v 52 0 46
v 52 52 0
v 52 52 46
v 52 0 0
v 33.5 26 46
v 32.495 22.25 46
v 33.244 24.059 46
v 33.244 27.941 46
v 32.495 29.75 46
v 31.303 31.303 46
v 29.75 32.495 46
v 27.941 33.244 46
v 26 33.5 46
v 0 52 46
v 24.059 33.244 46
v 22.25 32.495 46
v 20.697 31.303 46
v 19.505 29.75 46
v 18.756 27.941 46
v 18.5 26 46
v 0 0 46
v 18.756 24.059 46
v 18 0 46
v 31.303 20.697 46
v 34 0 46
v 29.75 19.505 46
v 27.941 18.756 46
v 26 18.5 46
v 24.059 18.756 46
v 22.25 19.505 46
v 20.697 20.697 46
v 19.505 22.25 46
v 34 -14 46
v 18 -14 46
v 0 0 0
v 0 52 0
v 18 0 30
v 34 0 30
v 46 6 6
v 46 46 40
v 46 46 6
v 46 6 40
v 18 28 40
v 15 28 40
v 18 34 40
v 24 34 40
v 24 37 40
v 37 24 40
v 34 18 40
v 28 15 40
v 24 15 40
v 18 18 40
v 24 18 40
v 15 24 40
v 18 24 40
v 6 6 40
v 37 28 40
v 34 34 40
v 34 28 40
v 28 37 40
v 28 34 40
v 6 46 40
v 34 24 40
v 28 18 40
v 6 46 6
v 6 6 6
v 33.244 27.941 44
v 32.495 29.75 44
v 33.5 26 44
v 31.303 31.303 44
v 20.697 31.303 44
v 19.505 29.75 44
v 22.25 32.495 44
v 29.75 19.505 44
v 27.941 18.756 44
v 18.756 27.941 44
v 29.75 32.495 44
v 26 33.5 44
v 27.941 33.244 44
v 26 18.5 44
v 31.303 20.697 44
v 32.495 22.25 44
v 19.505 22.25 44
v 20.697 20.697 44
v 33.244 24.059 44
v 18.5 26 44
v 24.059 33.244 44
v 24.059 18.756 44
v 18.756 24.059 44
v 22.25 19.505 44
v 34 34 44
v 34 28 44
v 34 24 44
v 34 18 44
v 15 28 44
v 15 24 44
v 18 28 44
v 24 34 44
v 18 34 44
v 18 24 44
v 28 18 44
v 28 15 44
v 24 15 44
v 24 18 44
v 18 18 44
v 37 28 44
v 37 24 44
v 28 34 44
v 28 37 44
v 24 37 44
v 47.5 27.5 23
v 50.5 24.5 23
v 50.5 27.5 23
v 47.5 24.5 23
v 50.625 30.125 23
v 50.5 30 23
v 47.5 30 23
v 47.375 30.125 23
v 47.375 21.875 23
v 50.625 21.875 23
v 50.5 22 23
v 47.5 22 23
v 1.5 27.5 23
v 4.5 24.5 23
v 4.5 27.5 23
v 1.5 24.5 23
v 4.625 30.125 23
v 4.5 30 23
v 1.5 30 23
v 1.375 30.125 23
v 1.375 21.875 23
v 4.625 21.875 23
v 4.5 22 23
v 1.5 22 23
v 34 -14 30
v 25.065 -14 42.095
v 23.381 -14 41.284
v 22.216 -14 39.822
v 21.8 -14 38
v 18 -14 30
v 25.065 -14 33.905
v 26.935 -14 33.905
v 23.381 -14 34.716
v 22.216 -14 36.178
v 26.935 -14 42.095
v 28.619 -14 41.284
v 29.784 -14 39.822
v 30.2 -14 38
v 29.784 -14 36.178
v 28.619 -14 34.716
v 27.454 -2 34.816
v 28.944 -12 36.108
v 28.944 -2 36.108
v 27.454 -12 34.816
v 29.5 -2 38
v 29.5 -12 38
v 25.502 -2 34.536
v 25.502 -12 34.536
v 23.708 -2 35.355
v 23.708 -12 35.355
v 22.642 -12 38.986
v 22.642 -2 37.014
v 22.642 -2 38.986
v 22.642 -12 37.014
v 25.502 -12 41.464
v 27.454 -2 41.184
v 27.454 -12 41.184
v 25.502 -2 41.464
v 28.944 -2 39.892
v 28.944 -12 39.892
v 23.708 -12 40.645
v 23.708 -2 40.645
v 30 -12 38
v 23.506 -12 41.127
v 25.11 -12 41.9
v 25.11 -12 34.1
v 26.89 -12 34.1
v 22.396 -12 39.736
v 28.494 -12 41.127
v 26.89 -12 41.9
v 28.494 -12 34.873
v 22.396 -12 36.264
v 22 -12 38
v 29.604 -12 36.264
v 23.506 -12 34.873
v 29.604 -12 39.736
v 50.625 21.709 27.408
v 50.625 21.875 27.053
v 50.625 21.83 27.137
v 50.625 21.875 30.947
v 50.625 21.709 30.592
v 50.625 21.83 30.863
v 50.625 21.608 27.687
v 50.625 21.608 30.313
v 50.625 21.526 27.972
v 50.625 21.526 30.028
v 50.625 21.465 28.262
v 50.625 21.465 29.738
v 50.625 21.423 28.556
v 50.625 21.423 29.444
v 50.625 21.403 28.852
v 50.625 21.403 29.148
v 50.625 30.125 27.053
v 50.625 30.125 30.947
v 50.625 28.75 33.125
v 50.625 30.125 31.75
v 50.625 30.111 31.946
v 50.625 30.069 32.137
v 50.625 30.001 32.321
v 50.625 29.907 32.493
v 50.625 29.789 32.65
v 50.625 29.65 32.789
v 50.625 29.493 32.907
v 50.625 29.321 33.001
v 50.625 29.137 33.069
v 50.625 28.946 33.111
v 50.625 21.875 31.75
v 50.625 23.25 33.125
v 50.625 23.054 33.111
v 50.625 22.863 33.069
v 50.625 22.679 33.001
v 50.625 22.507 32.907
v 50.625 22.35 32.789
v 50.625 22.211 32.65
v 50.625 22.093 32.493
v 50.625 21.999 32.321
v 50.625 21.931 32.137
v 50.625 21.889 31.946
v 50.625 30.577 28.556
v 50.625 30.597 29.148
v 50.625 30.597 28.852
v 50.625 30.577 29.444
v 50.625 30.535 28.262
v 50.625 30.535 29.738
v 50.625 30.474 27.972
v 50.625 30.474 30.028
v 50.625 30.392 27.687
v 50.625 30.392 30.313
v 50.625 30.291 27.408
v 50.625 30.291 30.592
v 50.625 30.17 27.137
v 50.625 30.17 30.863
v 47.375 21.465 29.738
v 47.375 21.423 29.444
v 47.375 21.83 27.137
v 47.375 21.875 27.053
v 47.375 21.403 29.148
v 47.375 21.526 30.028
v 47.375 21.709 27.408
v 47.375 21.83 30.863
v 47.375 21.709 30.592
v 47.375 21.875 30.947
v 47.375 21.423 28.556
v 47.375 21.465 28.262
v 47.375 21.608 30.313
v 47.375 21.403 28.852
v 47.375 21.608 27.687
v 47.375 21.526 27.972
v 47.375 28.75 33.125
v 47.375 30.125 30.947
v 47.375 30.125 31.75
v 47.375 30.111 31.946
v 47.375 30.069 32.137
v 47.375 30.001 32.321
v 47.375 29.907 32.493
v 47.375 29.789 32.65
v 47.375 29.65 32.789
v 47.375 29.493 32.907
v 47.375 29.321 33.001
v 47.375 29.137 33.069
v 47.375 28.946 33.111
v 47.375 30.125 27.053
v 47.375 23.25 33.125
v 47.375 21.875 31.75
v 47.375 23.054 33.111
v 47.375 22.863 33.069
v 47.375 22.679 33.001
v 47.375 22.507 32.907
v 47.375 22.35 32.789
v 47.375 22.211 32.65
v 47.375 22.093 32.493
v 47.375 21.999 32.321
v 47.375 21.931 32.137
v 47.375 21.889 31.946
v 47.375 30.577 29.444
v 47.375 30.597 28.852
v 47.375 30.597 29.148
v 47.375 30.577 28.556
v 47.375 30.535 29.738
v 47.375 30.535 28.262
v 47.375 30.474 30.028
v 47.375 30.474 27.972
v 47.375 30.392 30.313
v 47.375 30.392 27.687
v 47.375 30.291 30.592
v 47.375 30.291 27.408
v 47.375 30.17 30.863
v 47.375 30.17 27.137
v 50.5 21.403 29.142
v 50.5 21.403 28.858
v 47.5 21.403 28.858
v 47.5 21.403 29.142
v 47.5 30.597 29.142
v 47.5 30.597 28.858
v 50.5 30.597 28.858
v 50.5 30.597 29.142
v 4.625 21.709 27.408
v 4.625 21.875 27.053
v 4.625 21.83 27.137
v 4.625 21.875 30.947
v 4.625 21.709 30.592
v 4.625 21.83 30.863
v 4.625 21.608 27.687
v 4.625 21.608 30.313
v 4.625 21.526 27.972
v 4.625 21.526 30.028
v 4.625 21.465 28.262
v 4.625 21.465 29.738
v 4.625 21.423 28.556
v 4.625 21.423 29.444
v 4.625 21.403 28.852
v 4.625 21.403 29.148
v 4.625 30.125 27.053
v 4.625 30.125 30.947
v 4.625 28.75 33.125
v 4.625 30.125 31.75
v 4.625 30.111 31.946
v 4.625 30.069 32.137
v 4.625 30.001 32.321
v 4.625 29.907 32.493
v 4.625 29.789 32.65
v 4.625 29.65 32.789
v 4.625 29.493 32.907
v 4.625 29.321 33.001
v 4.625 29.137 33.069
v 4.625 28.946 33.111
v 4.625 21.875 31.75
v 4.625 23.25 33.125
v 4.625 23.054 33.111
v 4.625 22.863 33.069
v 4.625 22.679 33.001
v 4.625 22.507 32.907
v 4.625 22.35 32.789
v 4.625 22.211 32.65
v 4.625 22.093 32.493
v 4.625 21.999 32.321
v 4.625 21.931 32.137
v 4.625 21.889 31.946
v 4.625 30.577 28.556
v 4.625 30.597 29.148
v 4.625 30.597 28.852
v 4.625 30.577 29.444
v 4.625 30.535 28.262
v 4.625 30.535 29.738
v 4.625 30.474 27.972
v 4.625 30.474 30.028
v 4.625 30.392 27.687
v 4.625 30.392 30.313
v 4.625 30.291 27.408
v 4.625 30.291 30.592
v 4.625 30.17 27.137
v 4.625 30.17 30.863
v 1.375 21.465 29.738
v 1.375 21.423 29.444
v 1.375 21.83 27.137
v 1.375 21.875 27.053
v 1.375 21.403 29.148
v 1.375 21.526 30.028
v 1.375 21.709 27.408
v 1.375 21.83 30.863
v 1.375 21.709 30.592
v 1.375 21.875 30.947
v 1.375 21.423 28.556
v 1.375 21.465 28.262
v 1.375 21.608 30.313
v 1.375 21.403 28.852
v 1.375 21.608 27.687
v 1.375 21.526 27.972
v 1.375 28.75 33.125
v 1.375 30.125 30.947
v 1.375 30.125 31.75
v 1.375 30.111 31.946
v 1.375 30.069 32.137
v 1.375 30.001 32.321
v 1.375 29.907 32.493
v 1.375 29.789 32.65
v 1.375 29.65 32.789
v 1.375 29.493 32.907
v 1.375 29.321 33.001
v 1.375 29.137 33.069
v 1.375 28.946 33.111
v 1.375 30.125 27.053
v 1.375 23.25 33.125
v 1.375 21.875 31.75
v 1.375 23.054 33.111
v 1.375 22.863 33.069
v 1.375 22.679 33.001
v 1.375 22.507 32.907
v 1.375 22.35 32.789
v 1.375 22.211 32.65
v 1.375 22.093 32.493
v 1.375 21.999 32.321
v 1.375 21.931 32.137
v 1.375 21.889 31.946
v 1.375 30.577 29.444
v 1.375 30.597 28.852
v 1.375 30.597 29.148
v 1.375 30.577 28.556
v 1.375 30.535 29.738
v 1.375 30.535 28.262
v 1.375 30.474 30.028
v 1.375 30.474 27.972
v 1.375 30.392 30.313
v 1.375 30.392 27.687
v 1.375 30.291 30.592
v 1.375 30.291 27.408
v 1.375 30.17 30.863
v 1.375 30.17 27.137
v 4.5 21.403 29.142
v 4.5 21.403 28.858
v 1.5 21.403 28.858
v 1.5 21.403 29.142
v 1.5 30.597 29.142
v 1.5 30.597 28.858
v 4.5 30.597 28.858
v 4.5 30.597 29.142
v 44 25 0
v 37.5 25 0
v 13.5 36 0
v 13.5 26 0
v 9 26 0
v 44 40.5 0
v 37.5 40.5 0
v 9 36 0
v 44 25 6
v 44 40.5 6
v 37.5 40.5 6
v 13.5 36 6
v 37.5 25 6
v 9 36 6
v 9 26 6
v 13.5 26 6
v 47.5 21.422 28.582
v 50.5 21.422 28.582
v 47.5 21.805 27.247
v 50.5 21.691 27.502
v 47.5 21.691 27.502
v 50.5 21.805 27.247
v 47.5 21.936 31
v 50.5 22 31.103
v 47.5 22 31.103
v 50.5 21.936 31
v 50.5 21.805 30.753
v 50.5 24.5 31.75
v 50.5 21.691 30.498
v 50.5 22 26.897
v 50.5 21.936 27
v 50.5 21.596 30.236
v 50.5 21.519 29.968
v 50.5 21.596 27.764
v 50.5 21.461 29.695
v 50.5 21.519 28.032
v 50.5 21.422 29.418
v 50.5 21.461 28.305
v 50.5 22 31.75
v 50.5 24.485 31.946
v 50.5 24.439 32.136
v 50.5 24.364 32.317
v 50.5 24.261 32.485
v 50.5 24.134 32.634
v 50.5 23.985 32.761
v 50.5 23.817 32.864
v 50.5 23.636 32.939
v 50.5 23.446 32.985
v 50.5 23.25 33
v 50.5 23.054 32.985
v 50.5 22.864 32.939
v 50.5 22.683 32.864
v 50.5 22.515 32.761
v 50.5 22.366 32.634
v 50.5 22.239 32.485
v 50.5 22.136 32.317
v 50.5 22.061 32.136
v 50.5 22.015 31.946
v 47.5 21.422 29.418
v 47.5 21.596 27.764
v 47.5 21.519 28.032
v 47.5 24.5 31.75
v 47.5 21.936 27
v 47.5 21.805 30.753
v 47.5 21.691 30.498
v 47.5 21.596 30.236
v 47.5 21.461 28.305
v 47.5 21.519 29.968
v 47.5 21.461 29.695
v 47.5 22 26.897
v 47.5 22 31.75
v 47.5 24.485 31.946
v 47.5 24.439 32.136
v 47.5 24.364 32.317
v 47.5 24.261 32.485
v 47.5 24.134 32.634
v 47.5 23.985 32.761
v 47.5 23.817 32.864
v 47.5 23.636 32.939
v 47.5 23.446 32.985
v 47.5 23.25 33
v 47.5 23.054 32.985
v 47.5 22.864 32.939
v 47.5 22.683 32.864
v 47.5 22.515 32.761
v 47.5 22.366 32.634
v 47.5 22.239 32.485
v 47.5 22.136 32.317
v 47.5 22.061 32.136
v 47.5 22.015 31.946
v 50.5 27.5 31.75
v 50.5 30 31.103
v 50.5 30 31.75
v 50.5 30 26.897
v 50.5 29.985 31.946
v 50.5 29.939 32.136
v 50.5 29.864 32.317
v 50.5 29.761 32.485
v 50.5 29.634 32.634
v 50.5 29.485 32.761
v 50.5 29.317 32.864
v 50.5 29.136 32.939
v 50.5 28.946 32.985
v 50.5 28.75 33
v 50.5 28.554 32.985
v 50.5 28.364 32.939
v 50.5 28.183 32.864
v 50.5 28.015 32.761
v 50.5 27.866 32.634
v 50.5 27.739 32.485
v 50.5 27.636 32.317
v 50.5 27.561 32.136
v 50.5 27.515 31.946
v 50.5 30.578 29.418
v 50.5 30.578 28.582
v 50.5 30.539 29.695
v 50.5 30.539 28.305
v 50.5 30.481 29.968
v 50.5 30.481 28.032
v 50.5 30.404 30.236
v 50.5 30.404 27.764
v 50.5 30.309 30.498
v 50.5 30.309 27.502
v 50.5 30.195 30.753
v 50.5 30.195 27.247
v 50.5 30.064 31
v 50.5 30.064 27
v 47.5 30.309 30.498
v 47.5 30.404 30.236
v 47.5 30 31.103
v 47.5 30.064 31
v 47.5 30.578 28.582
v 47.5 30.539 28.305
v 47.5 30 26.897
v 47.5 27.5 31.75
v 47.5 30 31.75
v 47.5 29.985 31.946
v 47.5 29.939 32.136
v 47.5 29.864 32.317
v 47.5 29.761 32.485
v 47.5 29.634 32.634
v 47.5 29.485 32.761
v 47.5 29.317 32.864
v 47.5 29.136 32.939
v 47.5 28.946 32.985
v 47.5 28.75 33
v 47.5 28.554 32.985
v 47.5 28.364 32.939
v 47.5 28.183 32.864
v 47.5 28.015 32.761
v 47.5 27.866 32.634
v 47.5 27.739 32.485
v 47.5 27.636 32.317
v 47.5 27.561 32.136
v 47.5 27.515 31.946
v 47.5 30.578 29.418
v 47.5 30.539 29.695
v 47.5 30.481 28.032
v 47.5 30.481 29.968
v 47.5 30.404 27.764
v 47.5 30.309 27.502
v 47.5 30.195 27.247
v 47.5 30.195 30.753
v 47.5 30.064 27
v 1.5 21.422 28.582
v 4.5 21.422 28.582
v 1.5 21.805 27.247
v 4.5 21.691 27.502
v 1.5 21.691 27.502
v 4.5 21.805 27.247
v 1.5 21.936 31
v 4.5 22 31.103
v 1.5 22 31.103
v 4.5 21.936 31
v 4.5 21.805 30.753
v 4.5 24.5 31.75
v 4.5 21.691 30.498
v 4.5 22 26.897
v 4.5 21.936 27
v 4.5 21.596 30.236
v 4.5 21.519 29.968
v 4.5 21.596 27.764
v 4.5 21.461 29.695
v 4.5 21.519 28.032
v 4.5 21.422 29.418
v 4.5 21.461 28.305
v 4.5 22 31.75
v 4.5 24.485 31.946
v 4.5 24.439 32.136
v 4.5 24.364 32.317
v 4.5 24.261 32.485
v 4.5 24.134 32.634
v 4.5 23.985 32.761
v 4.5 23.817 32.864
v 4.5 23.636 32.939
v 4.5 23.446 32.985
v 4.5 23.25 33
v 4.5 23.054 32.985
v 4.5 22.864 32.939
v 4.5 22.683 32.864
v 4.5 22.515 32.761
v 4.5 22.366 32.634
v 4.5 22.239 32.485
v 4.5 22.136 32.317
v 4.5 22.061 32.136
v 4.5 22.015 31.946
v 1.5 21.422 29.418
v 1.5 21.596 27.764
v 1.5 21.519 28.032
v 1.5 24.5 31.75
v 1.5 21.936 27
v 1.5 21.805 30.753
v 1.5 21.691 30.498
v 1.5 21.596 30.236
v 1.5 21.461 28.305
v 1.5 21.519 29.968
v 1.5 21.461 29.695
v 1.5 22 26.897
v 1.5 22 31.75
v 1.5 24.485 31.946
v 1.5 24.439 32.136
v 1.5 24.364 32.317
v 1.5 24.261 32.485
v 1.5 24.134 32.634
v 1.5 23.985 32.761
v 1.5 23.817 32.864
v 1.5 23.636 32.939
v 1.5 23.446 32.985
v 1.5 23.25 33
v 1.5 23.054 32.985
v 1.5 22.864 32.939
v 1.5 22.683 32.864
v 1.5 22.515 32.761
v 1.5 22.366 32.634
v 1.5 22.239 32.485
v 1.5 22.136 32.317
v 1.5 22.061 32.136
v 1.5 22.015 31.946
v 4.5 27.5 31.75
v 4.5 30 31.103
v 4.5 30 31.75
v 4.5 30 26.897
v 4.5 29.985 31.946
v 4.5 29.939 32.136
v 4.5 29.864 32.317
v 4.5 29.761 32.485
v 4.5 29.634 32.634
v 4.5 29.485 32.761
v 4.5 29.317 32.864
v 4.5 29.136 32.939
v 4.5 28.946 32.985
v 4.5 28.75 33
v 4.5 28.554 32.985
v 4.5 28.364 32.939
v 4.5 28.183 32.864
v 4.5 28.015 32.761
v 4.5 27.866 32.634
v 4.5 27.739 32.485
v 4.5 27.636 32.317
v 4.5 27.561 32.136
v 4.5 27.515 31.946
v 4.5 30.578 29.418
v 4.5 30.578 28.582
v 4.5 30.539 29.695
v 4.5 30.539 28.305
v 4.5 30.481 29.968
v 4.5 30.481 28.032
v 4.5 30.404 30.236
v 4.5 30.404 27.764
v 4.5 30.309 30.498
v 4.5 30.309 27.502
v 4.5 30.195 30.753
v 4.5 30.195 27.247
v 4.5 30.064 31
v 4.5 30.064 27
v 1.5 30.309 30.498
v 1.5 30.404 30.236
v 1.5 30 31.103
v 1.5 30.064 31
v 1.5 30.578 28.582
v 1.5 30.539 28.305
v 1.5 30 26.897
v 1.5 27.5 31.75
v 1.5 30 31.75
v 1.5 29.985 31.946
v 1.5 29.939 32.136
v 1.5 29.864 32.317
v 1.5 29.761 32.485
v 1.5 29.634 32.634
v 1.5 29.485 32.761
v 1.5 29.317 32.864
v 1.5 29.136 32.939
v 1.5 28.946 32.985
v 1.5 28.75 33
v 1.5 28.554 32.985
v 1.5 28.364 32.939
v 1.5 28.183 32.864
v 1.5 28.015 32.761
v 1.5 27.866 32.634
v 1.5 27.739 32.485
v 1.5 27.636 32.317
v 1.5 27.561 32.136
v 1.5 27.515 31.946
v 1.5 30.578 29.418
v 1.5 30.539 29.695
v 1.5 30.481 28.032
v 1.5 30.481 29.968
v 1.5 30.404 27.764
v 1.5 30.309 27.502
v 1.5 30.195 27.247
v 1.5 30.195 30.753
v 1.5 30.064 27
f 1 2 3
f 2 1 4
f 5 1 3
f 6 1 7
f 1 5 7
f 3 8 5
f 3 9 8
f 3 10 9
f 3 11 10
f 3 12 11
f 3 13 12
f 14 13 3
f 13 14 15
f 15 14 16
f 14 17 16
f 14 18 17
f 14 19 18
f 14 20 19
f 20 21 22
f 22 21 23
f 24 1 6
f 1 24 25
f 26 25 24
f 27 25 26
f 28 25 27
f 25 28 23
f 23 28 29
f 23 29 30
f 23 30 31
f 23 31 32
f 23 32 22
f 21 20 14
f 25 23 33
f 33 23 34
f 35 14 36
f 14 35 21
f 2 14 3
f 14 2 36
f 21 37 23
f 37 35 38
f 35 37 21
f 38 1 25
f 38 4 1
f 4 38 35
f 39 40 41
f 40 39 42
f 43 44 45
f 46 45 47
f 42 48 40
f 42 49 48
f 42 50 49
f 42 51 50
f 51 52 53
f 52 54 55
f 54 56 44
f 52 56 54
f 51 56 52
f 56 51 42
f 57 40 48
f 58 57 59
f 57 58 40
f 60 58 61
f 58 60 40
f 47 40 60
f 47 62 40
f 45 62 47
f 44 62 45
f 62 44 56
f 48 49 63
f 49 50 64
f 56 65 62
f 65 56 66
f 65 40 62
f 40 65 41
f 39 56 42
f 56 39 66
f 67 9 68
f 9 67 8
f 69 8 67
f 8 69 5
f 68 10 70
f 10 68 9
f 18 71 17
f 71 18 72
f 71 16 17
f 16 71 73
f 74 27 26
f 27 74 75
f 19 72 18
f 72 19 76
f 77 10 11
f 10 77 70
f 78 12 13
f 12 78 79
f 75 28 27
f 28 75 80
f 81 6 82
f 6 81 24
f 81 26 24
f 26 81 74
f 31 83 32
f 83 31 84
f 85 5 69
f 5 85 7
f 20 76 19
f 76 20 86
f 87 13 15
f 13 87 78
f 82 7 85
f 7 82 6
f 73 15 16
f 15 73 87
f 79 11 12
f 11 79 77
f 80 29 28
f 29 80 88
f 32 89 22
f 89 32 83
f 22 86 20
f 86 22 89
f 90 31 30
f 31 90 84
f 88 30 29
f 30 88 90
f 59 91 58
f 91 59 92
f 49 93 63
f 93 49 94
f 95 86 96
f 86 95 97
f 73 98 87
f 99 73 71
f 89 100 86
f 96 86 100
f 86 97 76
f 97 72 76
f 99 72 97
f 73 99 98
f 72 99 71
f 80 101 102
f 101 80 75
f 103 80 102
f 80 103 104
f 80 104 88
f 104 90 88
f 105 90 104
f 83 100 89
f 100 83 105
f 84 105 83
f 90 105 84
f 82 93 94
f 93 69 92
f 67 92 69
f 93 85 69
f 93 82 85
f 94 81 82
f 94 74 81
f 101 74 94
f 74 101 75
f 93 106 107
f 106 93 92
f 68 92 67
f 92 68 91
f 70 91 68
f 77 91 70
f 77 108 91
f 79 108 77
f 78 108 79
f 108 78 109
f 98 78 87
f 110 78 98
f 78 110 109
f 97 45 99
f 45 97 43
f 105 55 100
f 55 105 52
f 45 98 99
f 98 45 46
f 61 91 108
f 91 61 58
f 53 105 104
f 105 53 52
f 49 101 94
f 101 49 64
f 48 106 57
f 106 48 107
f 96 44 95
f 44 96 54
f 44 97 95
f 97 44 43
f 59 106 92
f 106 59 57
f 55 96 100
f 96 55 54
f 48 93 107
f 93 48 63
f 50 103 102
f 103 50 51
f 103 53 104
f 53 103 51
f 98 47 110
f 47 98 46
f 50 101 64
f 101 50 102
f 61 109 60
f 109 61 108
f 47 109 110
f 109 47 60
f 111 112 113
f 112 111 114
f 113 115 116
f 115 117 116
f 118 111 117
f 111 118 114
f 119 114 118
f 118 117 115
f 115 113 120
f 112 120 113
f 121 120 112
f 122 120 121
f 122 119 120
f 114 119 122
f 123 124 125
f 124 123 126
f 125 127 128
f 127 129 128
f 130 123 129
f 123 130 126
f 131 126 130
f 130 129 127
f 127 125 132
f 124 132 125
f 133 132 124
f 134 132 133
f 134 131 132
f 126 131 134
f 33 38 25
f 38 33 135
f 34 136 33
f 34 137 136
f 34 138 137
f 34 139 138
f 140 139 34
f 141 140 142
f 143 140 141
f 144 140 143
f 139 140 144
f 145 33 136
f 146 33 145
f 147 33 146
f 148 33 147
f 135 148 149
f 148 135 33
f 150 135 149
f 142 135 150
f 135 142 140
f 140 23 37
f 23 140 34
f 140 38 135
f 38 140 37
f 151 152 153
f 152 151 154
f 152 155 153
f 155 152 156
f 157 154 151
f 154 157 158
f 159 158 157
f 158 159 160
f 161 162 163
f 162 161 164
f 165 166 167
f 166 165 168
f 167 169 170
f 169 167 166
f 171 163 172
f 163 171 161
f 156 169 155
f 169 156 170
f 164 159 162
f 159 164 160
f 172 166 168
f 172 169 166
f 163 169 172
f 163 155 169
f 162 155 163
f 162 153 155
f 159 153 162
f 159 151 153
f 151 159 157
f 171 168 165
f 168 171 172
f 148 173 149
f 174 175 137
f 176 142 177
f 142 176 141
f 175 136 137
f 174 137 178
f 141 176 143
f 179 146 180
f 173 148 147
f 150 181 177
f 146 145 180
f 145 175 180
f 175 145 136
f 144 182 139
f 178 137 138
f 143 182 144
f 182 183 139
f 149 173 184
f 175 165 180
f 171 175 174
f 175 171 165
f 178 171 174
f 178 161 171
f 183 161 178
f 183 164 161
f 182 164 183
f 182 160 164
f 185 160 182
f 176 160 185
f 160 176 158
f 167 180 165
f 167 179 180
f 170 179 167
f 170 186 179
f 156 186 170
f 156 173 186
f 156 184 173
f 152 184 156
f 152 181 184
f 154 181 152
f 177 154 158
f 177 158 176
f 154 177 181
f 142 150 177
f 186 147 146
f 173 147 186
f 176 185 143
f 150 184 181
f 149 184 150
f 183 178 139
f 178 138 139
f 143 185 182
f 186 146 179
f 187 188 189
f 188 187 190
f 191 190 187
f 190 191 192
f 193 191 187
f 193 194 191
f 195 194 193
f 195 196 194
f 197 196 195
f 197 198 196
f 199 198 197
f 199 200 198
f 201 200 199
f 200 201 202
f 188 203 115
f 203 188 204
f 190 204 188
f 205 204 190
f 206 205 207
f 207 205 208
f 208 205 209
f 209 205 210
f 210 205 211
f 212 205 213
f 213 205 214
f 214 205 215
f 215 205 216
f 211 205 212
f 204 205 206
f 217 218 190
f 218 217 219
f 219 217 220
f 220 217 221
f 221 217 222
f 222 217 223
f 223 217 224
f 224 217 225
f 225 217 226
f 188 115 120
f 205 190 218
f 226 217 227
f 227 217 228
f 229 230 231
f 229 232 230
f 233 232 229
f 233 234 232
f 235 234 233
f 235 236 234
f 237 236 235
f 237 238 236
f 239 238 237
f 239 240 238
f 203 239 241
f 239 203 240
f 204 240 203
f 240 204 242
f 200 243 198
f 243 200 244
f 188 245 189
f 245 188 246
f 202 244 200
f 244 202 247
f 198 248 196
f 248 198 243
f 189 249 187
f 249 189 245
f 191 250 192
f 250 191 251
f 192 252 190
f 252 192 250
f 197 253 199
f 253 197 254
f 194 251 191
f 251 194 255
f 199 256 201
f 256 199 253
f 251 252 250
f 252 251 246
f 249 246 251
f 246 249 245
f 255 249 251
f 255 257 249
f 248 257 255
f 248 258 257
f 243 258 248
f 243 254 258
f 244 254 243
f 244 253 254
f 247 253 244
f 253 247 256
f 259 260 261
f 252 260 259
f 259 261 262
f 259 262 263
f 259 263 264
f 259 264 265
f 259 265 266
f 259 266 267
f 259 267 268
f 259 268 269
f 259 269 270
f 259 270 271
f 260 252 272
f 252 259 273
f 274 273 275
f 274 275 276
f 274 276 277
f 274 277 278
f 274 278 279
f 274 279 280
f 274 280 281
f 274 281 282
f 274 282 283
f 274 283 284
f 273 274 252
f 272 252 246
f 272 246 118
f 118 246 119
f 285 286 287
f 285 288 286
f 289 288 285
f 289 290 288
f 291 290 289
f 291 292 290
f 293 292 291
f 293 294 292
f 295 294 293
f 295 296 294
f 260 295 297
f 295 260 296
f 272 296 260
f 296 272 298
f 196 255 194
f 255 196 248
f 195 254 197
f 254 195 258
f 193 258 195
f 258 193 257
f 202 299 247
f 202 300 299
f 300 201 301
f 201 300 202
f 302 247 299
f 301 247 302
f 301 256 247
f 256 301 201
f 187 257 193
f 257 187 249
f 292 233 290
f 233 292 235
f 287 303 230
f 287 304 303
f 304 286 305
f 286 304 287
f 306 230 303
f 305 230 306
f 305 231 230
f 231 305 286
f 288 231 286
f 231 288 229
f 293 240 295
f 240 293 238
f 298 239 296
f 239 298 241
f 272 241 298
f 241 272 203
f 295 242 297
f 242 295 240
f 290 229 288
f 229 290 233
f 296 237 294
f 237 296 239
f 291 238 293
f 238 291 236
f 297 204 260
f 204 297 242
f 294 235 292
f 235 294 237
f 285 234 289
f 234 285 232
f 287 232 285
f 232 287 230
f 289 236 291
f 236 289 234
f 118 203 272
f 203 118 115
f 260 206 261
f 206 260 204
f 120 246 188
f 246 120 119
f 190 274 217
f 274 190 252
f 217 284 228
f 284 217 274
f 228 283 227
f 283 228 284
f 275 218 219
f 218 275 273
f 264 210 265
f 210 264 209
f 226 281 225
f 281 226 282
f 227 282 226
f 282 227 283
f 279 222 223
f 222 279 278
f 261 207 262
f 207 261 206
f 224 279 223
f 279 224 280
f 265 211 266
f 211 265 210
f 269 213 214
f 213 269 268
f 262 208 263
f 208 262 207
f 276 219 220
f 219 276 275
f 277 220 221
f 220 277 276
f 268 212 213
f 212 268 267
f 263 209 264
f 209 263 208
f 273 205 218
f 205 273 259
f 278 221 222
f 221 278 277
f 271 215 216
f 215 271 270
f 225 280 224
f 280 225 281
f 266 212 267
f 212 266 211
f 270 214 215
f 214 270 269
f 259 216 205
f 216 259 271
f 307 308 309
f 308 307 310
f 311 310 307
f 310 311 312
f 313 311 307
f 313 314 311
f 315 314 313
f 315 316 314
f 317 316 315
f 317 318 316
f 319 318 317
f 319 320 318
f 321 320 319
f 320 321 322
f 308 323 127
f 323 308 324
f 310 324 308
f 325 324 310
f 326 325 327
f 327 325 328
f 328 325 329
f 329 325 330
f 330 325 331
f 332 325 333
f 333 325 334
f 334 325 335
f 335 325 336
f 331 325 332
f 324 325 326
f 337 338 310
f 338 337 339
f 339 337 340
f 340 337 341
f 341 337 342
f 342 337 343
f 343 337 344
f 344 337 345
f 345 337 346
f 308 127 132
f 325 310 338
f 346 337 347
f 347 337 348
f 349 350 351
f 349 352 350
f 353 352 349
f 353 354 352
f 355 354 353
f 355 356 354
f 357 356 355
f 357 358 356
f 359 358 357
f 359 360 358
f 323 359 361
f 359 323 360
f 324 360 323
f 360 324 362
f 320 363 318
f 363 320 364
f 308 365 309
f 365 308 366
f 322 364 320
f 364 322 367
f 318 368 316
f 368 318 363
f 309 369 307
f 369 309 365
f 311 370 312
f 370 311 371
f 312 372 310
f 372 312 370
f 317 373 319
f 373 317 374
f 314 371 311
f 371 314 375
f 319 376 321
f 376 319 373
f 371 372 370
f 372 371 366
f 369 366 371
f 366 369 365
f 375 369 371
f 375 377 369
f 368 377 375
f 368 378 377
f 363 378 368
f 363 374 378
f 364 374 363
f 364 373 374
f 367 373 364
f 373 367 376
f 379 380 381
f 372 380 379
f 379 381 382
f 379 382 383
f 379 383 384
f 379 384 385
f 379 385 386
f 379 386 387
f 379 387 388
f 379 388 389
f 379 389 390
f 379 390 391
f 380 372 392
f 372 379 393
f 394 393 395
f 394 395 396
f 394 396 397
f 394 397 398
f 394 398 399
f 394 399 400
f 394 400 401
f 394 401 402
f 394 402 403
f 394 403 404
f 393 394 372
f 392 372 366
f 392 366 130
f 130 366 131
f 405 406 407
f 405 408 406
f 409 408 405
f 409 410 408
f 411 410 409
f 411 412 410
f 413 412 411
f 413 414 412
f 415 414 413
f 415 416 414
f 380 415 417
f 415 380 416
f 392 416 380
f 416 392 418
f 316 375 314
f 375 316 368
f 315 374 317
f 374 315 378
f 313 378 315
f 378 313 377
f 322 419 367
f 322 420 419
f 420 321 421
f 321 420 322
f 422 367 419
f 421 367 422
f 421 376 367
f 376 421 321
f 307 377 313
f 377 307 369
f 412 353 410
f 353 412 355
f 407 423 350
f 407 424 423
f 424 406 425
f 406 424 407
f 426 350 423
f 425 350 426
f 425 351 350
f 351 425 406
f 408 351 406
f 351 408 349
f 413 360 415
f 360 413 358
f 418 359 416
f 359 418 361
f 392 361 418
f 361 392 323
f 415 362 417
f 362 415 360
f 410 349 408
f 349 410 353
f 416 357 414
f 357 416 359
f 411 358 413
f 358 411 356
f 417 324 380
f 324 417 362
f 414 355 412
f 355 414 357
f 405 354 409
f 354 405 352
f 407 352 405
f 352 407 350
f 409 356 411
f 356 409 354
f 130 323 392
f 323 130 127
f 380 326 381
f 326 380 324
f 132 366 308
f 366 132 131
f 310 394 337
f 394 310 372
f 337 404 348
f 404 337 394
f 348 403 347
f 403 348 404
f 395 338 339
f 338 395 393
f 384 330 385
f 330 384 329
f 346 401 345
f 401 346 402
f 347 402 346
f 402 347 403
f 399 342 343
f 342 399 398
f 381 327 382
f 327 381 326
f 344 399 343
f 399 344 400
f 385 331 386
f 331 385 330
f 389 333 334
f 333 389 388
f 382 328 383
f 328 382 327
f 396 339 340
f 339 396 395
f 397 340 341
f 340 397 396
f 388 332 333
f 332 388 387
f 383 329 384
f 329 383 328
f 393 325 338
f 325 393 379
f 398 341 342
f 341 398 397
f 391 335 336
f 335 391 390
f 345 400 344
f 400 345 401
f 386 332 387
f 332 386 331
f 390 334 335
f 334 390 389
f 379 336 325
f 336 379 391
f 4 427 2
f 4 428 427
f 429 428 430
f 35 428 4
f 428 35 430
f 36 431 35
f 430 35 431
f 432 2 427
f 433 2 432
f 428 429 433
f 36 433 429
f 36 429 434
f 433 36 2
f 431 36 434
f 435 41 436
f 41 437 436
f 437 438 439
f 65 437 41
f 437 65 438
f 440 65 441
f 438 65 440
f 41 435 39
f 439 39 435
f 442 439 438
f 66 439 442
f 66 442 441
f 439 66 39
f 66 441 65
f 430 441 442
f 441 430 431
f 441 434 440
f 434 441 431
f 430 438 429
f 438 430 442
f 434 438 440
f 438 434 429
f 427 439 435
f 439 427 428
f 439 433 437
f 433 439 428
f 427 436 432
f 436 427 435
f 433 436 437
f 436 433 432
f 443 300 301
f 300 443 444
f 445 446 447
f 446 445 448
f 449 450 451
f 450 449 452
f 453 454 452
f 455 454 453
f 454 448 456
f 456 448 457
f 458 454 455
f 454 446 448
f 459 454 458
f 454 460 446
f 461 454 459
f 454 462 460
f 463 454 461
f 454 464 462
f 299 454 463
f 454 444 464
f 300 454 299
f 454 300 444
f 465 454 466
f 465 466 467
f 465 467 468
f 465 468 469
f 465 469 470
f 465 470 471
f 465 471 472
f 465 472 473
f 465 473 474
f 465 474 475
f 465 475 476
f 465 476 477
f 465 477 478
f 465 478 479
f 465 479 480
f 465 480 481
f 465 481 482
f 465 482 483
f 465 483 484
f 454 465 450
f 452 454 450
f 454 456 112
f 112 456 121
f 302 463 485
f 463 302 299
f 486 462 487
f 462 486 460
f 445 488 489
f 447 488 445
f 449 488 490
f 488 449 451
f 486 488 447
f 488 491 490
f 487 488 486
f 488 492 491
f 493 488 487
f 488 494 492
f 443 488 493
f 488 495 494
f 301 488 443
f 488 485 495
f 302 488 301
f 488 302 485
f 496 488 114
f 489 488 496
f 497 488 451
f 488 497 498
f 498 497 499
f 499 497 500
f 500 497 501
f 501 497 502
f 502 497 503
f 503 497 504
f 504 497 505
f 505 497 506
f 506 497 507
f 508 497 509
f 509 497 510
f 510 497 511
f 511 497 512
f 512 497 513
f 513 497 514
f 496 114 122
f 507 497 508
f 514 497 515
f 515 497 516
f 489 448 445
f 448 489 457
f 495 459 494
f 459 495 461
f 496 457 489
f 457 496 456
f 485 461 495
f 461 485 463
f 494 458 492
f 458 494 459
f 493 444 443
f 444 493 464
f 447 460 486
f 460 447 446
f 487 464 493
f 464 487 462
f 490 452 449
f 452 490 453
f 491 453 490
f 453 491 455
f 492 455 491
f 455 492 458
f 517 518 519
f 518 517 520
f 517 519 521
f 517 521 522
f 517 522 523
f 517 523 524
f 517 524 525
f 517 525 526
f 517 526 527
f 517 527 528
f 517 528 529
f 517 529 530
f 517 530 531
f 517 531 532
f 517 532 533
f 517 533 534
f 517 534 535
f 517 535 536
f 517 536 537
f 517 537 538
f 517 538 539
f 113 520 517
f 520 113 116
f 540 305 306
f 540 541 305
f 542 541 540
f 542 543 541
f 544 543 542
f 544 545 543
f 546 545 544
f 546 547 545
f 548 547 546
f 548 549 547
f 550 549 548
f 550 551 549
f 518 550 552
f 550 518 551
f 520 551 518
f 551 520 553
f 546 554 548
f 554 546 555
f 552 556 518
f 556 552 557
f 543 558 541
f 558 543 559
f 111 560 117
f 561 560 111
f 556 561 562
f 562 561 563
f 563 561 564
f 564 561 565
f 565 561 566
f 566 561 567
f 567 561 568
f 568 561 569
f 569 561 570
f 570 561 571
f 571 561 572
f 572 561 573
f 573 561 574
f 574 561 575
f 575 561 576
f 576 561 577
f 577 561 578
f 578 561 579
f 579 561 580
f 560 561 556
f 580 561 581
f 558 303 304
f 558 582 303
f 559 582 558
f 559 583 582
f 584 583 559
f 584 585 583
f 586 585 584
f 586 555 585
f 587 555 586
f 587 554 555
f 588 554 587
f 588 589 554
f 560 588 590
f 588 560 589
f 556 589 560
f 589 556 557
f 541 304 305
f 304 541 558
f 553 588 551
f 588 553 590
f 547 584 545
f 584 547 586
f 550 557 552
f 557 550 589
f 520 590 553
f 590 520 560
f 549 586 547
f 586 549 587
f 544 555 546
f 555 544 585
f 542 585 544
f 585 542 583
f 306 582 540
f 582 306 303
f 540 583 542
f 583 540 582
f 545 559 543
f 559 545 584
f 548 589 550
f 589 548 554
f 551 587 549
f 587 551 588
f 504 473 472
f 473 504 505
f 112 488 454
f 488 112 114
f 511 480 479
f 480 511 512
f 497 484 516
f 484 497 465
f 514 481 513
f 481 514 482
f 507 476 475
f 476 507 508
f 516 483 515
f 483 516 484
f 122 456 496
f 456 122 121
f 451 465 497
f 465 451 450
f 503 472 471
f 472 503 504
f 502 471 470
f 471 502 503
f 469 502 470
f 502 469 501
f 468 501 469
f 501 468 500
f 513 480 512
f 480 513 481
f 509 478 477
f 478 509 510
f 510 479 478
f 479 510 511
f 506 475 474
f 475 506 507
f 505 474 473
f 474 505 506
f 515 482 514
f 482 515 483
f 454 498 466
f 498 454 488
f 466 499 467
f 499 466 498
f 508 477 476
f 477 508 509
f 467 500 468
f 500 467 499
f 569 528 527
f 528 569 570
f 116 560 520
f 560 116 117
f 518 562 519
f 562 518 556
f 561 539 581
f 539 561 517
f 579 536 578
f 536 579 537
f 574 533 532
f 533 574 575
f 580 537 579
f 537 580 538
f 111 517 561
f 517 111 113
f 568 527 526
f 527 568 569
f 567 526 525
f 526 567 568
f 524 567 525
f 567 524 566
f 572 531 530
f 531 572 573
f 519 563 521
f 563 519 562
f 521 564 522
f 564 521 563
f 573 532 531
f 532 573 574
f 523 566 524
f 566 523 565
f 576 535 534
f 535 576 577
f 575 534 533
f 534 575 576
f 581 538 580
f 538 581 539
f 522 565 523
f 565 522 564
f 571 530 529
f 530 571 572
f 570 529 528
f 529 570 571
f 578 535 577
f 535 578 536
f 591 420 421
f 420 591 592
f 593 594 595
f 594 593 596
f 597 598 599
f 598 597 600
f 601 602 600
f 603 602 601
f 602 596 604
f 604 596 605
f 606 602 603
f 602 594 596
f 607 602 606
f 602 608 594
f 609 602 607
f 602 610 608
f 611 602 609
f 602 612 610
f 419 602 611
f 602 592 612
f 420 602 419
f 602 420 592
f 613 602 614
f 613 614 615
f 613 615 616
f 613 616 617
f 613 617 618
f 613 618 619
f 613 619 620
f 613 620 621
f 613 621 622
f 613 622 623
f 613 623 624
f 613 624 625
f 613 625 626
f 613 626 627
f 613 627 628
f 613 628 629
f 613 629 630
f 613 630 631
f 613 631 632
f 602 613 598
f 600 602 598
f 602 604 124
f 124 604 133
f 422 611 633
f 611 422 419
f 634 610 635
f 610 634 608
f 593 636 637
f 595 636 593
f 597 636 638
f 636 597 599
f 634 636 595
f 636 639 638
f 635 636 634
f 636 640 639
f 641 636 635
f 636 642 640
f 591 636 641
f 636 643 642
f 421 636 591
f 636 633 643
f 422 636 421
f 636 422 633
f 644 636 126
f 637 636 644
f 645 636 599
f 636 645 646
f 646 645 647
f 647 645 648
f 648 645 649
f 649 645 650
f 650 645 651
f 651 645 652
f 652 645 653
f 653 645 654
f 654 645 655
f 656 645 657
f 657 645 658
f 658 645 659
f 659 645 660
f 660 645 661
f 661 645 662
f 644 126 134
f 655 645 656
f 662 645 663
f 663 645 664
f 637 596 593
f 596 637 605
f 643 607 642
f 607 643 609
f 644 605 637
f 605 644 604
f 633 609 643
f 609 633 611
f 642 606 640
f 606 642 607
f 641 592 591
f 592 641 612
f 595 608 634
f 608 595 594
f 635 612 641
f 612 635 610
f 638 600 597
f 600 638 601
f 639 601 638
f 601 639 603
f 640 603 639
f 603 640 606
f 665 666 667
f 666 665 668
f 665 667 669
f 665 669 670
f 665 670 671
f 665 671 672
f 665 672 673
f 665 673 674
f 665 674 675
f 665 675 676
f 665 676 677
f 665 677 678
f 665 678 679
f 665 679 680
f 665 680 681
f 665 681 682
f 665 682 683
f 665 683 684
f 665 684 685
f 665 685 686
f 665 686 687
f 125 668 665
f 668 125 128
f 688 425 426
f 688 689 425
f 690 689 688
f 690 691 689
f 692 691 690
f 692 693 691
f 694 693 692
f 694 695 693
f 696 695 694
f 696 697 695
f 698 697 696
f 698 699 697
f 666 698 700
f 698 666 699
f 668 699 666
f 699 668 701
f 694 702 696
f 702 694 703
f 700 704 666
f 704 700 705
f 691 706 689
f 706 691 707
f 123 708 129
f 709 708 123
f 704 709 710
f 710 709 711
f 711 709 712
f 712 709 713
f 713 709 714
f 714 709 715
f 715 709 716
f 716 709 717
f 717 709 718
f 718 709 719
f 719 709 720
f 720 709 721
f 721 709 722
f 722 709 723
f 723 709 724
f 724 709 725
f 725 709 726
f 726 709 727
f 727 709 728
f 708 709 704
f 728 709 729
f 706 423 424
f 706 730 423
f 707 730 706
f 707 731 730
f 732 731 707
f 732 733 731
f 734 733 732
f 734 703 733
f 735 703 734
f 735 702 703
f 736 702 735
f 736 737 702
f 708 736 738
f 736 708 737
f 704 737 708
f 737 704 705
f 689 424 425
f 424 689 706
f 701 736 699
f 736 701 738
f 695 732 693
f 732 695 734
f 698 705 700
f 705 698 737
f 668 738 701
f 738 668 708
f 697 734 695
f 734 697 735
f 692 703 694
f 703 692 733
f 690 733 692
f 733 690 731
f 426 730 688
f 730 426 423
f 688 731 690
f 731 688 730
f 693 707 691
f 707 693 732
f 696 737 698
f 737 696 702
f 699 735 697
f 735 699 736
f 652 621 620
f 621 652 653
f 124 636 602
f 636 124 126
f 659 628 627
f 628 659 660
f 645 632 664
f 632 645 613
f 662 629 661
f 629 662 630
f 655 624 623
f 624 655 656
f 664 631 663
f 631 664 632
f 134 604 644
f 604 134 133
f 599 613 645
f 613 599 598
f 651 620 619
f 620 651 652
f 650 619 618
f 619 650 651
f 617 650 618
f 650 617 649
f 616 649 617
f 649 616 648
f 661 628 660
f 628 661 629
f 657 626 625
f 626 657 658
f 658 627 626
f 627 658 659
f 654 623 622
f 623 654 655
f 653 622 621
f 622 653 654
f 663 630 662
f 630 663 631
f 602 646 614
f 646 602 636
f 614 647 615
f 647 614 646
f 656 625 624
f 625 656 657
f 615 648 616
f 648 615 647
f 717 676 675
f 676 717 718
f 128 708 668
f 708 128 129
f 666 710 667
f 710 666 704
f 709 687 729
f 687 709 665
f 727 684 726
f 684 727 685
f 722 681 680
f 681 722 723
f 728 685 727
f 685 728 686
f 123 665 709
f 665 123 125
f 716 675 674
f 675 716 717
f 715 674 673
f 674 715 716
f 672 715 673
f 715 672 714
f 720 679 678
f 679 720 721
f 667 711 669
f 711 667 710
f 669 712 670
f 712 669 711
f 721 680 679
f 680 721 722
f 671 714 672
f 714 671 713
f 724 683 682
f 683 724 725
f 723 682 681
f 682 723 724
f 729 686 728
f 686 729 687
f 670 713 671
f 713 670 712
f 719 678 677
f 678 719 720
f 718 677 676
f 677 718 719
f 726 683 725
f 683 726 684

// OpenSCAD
// file: parameterized_clip.scad
// parameterized_clip.scad
// Copyright (c)2023 DP design / Daniel Perry
// place this file in the correct OpenSCAD library directory for your operating system,
// then add:
// use parameterized_clip.scad
// to your code


clip_width = 10;
clip_length = 20;
clip_thickness = 20;
clip_arm_width = 1;
clip_body_length = 4;
tab_protrusion = 0.8;
clip_male_female_delta = 0.25;
angled_clip_Boolean = true;    // need a larger clip_thickness to make sense
locking_clip_Boolean = true;

$fs = 0.2;
$fa = 4;

test_body1();
translate([0, 50,0]) test_body2();
//test_body3();

module test_body1() {
    difference() {
        union() {
            cube([30, 20, 5], center = true);
            translate([14.9, 0, -0.5*(5-3)]) male_clip(clip_length, clip_width, 3, clip_arm_width, clip_body_length, tab_protrusion, false, false);

        }
        translate([-15.1, 0, -0.5*(5-3)]) female_clip(clip_length, clip_width, 3, clip_arm_width, clip_body_length, tab_protrusion, false, false, clip_male_female_delta);
    }
}

module test_body2() {   // angled clip
    difference() {
        union() {
            cube([30, 20, 30], center = true);
            translate([14.9, 0, 0]) male_clip( 20, 10, 20, 1, 0, 0.8, true, false );
        }
        translate([-15.1, 0, 0]) female_clip( 20, 10, 20, 1, 0, 0.8, true, false, clip_male_female_delta );
    }
}

module test_body3() {   // angled clip
    difference() {
        union() {
            cube([30, 20, 30], center = true);
            translate([14.9, 0, 0]) male_clip( 20, 10, 20, 1, 0, 0.8, true, true );
        }
        translate([-15.1, 0, 0]) female_clip( 20, 10, 20, 1, 0, 0.8, true, true, clip_male_female_delta );
    }
}


// male_clip( clip_length, clip_width, clip_thickness, clip_arm_width, clip_body_length, tab_protrusion, angled_clip_Boolean, locking_clip_Boolean );
// translate([0, 30, 0])
//      female_clip( clip_length, clip_width, clip_thickness, clip_arm_width, clip_body_length, tab_protrusion, angled_clip_Boolean, locking_clip_Boolean, clip_male_female_delta );

module female_clip(clength, cwidth, cthick, carmw, cbodyl, tabp, acBool, lcBool, delta) {
    tab_dist_from_end = 4;
    tab_radius = 4 + delta;
    blocker_length = 2*tab_radius + 2;
    difference() {
        union() {
            hull() {
                translate([clength - 0.5*carmw, -0.5*(cwidth - carmw), 0]) cylinder( h = cthick + delta, d = carmw + delta, center = true );
                translate([1, -0.5*(cwidth - carmw), 0]) cube([2, carmw + delta, cthick + delta], center = true);
            // }
            // hull() {
                translate([clength - 0.5*carmw, 0.5*(cwidth - carmw), 0]) cylinder( h = cthick + delta, d = carmw + delta, center = true );
                translate([1, 0.5*(cwidth - carmw), 0]) cube([2, carmw + delta, cthick + delta], center = true);
            }
            translate([0.5*cbodyl, 0, 0]) cube([cbodyl, cwidth, cthick + delta], center = true);

            difference() {
                translate([clength - tab_dist_from_end, -0.5*cwidth + tab_radius - tabp, 0]) cylinder(h = cthick + delta, r = tab_radius, center = true);
                translate([clength - tab_dist_from_end, -0.5*cwidth + 0.5*carmw + 0.5*blocker_length, 0]) 
                    cube([blocker_length, blocker_length, cthick + 2], center = true);
                if (lcBool) {
                    translate([clength - 0.5*blocker_length - tab_dist_from_end, -0.5*blocker_length, 0])
                        cube([blocker_length, blocker_length, cthick + 2], center = true);
                }
            }
            difference() {
                translate([clength - tab_dist_from_end, 0.5*cwidth - (tab_radius - tabp), 0]) cylinder(h = cthick + delta, r = tab_radius, center = true);
                translate([clength - tab_dist_from_end, 0.5*cwidth - 0.5*carmw - 0.5*blocker_length, 0]) 
                    cube([blocker_length, blocker_length, cthick + 2], center = true);
                if (lcBool) {
                    translate([clength - 0.5*blocker_length - tab_dist_from_end, cwidth - 0.5*blocker_length, 0])
                        cube([blocker_length, blocker_length, cthick + 2], center = true);
                }
            }
        }
        if (acBool) {
            translate([0.5*clength, 0, -0.5*cthick])  rotate([0, 55, 0])
                cube([clength/(2*sin(55)), 2*cwidth, 5*cthick], center = true );
        }

    }
}

module male_clip(clength, cwidth, cthick, carmw, cbodyl, tabp, acBool, lcBool ) {
    tab_dist_from_end = 4;
    tab_radius = 4;
    blocker_length = 2*tab_radius + 2;
    difference() {
        union() {
            hull() {
                translate([clength - 0.5*carmw, -0.5*(cwidth - carmw), 0]) cylinder( h = cthick, d = carmw, center = true );
                translate([1, -0.5*(cwidth - carmw), 0]) cube([2, carmw, cthick], center = true);
            }
            hull() {
                translate([clength - 0.5*carmw, 0.5*(cwidth - carmw), 0]) cylinder( h = cthick, d = carmw, center = true );
                translate([1, 0.5*(cwidth - carmw), 0]) cube([2, carmw, cthick], center = true);
            }
            translate([0.5*cbodyl, 0, 0]) cube([cbodyl, cwidth, cthick], center = true);

            difference() {
                translate([clength - tab_dist_from_end, -0.5*cwidth + tab_radius - tabp, 0]) cylinder(h = cthick, r = tab_radius, center = true);
                translate([clength - tab_dist_from_end, -0.5*cwidth + 0.5*carmw + 0.5*blocker_length, 0]) 
                    cube([blocker_length, blocker_length, cthick + 2], center = true);
                if (lcBool) {
                    translate([clength - 0.5*blocker_length - tab_dist_from_end, -0.5*blocker_length, 0])
                        cube([blocker_length, blocker_length, cthick + 2], center = true);
                }
            }
            difference() {
                translate([clength - tab_dist_from_end, 0.5*cwidth - (tab_radius - tabp), 0]) cylinder(h = cthick, r = tab_radius, center = true);
                translate([clength - tab_dist_from_end, 0.5*cwidth - 0.5*carmw - 0.5*blocker_length, 0]) 
                    cube([blocker_length, blocker_length, cthick + 2], center = true);
                if (lcBool) {
                    translate([clength - 0.5*blocker_length - tab_dist_from_end, cwidth - 0.5*blocker_length, 0])
                        cube([blocker_length, blocker_length, cthick + 2], center = true);
                }
             }
        }
        if (acBool) {
            translate([0.5*clength, 0, -0.5*cthick])  rotate([0, 55, 0])
                cube([clength/(2*sin(55)), 2*cwidth, 5*cthick], center = true );
        }
    }
}
// main file
use <parameterized_clip.scad>;

width=38;
height=38;
depth=32;

thickness=6;

module usbc() {
    cube([10, 4.5, 10]);
}

module hdmi() {
    cube([15.5, 6.5, 10]);
}

module lens_mount() {
    cylinder(r=7.5, h=20);
    translate([-8, -8, 0]) {
            cube([16, 16, 5]);
    }
    translate([-22/2, -2, 0]) {
            cube([22, 4, 5]);
    }
    translate([2, -22/2, 0]) {
        rotate([0, 0, 90]) {
            cube([22, 4, 5]);
        }
    }
}

module camera_inner() {
    cube([width, height, depth]);
    translate([6.5, 19, -10]) {
        rotate([0, 0, 90]) {
            usbc();
        }
    }

    translate([width-1, 18, -10]) {
        rotate([0, 0, 90]) {
            hdmi();
        }
    }

    translate([width / 2, height / 2, depth]) {
            lens_mount();
    }
}

module box(width, height, depth, thickness) {
    difference() {
        cube([width, height, depth]);
        translate([thickness, thickness, thickness]) {
            cube([width - 2 * thickness, height - 2 * thickness, depth - 2 * thickness]);
        }
    }
}

module tripod_mount() {
    difference() {
        cube([16, 16, 14]);
        translate([8, 8, 0]) {
            cylinder(12, 3.5, 3.5);
        }
        translate([8, 8, 0]) {
            cylinder(2, 4.2, 4.0);
        }
    }
}

box_margin = 2;

centre_offset = box_margin/2 + thickness;
box_width = width + box_margin + 2*thickness;
box_height = height + box_margin + 2*thickness;
box_depth = depth + box_margin + 2*thickness;

module casing() {

    box_margin = 2;

    centre_offset = box_margin/2 + thickness;
    box_width = width + box_margin + 2*thickness;
    box_height = height + box_margin + 2*thickness;
    box_depth = depth + box_margin + 2*thickness;

    difference(){
        box(box_width, box_height, box_depth, thickness);
        
        translate([centre_offset, centre_offset, centre_offset]) {
            camera_inner();
        }
    };
}

clip_width = 8;
clip_length = 10;
clip_thickness = thickness/2;
clip_arm_width = 2.5;
clip_body_length = 0;
tab_protrusion = 0.6;
clip_male_female_delta = 0.25;

module back() {
    intersection() {
        casing();
        cube([box_width*2, box_height*2, box_depth/2]);
    }
    translate([box_width-thickness/2, box_height/2, box_depth/2]) {
        rotate([0, -90, 0]) {
            male_clip(clip_length, clip_width, clip_thickness, clip_arm_width, clip_body_length, tab_protrusion, false, false);
        }
    }
    translate([thickness/2, box_height/2, box_depth/2]) {
        rotate([0, -90, 0]) {
            male_clip(clip_length, clip_width, clip_thickness, clip_arm_width, clip_body_length, tab_protrusion, false, false);
        }
    }
}

module front() {
        difference() {
        //        translate([8, 8, 0]) {
        //    cylinder(8, 3, 3);
        //}
            union() {
                difference() {
                    casing();                
                    translate([-box_width, -box_height, -box_depth/2]) {
                        cube([box_width*3, box_height*3, box_depth]);
                    }
                }

                translate([box_width/2-8,-14,box_depth]) {
                    rotate([-90,0,0]) {
                        tripod_mount();
                    }
                }
            }

            translate([box_width-thickness/2, box_height/2, box_depth/2]) {
                rotate([0, -90, 0]) {
                    female_clip(clip_length, clip_width, clip_thickness, clip_arm_width, clip_body_length, tab_protrusion, false, false, clip_male_female_delta);
                }
            }

            translate([thickness/2, box_height/2, box_depth/2]) {
                rotate([0, -90, 0]) {
                    female_clip(clip_length, clip_width, clip_thickness, clip_arm_width, clip_body_length, tab_protrusion, false, false, clip_male_female_delta);
                }
            }
        }
}

module explode(distance = [0, 0, $t* 30], center = false, enable = true) {
    if(enable){
        offset = center ? (($children * distance) / 2 - distance / 2) * -1 : [0, 0 , 0];
        for(i = [0 : 1 : $children - 1]) {
            translate(-i * distance + offset) {
                children(i);
            }
        }
    } else {
        children();
    }
}

explode() {
    front();
    back();
};
